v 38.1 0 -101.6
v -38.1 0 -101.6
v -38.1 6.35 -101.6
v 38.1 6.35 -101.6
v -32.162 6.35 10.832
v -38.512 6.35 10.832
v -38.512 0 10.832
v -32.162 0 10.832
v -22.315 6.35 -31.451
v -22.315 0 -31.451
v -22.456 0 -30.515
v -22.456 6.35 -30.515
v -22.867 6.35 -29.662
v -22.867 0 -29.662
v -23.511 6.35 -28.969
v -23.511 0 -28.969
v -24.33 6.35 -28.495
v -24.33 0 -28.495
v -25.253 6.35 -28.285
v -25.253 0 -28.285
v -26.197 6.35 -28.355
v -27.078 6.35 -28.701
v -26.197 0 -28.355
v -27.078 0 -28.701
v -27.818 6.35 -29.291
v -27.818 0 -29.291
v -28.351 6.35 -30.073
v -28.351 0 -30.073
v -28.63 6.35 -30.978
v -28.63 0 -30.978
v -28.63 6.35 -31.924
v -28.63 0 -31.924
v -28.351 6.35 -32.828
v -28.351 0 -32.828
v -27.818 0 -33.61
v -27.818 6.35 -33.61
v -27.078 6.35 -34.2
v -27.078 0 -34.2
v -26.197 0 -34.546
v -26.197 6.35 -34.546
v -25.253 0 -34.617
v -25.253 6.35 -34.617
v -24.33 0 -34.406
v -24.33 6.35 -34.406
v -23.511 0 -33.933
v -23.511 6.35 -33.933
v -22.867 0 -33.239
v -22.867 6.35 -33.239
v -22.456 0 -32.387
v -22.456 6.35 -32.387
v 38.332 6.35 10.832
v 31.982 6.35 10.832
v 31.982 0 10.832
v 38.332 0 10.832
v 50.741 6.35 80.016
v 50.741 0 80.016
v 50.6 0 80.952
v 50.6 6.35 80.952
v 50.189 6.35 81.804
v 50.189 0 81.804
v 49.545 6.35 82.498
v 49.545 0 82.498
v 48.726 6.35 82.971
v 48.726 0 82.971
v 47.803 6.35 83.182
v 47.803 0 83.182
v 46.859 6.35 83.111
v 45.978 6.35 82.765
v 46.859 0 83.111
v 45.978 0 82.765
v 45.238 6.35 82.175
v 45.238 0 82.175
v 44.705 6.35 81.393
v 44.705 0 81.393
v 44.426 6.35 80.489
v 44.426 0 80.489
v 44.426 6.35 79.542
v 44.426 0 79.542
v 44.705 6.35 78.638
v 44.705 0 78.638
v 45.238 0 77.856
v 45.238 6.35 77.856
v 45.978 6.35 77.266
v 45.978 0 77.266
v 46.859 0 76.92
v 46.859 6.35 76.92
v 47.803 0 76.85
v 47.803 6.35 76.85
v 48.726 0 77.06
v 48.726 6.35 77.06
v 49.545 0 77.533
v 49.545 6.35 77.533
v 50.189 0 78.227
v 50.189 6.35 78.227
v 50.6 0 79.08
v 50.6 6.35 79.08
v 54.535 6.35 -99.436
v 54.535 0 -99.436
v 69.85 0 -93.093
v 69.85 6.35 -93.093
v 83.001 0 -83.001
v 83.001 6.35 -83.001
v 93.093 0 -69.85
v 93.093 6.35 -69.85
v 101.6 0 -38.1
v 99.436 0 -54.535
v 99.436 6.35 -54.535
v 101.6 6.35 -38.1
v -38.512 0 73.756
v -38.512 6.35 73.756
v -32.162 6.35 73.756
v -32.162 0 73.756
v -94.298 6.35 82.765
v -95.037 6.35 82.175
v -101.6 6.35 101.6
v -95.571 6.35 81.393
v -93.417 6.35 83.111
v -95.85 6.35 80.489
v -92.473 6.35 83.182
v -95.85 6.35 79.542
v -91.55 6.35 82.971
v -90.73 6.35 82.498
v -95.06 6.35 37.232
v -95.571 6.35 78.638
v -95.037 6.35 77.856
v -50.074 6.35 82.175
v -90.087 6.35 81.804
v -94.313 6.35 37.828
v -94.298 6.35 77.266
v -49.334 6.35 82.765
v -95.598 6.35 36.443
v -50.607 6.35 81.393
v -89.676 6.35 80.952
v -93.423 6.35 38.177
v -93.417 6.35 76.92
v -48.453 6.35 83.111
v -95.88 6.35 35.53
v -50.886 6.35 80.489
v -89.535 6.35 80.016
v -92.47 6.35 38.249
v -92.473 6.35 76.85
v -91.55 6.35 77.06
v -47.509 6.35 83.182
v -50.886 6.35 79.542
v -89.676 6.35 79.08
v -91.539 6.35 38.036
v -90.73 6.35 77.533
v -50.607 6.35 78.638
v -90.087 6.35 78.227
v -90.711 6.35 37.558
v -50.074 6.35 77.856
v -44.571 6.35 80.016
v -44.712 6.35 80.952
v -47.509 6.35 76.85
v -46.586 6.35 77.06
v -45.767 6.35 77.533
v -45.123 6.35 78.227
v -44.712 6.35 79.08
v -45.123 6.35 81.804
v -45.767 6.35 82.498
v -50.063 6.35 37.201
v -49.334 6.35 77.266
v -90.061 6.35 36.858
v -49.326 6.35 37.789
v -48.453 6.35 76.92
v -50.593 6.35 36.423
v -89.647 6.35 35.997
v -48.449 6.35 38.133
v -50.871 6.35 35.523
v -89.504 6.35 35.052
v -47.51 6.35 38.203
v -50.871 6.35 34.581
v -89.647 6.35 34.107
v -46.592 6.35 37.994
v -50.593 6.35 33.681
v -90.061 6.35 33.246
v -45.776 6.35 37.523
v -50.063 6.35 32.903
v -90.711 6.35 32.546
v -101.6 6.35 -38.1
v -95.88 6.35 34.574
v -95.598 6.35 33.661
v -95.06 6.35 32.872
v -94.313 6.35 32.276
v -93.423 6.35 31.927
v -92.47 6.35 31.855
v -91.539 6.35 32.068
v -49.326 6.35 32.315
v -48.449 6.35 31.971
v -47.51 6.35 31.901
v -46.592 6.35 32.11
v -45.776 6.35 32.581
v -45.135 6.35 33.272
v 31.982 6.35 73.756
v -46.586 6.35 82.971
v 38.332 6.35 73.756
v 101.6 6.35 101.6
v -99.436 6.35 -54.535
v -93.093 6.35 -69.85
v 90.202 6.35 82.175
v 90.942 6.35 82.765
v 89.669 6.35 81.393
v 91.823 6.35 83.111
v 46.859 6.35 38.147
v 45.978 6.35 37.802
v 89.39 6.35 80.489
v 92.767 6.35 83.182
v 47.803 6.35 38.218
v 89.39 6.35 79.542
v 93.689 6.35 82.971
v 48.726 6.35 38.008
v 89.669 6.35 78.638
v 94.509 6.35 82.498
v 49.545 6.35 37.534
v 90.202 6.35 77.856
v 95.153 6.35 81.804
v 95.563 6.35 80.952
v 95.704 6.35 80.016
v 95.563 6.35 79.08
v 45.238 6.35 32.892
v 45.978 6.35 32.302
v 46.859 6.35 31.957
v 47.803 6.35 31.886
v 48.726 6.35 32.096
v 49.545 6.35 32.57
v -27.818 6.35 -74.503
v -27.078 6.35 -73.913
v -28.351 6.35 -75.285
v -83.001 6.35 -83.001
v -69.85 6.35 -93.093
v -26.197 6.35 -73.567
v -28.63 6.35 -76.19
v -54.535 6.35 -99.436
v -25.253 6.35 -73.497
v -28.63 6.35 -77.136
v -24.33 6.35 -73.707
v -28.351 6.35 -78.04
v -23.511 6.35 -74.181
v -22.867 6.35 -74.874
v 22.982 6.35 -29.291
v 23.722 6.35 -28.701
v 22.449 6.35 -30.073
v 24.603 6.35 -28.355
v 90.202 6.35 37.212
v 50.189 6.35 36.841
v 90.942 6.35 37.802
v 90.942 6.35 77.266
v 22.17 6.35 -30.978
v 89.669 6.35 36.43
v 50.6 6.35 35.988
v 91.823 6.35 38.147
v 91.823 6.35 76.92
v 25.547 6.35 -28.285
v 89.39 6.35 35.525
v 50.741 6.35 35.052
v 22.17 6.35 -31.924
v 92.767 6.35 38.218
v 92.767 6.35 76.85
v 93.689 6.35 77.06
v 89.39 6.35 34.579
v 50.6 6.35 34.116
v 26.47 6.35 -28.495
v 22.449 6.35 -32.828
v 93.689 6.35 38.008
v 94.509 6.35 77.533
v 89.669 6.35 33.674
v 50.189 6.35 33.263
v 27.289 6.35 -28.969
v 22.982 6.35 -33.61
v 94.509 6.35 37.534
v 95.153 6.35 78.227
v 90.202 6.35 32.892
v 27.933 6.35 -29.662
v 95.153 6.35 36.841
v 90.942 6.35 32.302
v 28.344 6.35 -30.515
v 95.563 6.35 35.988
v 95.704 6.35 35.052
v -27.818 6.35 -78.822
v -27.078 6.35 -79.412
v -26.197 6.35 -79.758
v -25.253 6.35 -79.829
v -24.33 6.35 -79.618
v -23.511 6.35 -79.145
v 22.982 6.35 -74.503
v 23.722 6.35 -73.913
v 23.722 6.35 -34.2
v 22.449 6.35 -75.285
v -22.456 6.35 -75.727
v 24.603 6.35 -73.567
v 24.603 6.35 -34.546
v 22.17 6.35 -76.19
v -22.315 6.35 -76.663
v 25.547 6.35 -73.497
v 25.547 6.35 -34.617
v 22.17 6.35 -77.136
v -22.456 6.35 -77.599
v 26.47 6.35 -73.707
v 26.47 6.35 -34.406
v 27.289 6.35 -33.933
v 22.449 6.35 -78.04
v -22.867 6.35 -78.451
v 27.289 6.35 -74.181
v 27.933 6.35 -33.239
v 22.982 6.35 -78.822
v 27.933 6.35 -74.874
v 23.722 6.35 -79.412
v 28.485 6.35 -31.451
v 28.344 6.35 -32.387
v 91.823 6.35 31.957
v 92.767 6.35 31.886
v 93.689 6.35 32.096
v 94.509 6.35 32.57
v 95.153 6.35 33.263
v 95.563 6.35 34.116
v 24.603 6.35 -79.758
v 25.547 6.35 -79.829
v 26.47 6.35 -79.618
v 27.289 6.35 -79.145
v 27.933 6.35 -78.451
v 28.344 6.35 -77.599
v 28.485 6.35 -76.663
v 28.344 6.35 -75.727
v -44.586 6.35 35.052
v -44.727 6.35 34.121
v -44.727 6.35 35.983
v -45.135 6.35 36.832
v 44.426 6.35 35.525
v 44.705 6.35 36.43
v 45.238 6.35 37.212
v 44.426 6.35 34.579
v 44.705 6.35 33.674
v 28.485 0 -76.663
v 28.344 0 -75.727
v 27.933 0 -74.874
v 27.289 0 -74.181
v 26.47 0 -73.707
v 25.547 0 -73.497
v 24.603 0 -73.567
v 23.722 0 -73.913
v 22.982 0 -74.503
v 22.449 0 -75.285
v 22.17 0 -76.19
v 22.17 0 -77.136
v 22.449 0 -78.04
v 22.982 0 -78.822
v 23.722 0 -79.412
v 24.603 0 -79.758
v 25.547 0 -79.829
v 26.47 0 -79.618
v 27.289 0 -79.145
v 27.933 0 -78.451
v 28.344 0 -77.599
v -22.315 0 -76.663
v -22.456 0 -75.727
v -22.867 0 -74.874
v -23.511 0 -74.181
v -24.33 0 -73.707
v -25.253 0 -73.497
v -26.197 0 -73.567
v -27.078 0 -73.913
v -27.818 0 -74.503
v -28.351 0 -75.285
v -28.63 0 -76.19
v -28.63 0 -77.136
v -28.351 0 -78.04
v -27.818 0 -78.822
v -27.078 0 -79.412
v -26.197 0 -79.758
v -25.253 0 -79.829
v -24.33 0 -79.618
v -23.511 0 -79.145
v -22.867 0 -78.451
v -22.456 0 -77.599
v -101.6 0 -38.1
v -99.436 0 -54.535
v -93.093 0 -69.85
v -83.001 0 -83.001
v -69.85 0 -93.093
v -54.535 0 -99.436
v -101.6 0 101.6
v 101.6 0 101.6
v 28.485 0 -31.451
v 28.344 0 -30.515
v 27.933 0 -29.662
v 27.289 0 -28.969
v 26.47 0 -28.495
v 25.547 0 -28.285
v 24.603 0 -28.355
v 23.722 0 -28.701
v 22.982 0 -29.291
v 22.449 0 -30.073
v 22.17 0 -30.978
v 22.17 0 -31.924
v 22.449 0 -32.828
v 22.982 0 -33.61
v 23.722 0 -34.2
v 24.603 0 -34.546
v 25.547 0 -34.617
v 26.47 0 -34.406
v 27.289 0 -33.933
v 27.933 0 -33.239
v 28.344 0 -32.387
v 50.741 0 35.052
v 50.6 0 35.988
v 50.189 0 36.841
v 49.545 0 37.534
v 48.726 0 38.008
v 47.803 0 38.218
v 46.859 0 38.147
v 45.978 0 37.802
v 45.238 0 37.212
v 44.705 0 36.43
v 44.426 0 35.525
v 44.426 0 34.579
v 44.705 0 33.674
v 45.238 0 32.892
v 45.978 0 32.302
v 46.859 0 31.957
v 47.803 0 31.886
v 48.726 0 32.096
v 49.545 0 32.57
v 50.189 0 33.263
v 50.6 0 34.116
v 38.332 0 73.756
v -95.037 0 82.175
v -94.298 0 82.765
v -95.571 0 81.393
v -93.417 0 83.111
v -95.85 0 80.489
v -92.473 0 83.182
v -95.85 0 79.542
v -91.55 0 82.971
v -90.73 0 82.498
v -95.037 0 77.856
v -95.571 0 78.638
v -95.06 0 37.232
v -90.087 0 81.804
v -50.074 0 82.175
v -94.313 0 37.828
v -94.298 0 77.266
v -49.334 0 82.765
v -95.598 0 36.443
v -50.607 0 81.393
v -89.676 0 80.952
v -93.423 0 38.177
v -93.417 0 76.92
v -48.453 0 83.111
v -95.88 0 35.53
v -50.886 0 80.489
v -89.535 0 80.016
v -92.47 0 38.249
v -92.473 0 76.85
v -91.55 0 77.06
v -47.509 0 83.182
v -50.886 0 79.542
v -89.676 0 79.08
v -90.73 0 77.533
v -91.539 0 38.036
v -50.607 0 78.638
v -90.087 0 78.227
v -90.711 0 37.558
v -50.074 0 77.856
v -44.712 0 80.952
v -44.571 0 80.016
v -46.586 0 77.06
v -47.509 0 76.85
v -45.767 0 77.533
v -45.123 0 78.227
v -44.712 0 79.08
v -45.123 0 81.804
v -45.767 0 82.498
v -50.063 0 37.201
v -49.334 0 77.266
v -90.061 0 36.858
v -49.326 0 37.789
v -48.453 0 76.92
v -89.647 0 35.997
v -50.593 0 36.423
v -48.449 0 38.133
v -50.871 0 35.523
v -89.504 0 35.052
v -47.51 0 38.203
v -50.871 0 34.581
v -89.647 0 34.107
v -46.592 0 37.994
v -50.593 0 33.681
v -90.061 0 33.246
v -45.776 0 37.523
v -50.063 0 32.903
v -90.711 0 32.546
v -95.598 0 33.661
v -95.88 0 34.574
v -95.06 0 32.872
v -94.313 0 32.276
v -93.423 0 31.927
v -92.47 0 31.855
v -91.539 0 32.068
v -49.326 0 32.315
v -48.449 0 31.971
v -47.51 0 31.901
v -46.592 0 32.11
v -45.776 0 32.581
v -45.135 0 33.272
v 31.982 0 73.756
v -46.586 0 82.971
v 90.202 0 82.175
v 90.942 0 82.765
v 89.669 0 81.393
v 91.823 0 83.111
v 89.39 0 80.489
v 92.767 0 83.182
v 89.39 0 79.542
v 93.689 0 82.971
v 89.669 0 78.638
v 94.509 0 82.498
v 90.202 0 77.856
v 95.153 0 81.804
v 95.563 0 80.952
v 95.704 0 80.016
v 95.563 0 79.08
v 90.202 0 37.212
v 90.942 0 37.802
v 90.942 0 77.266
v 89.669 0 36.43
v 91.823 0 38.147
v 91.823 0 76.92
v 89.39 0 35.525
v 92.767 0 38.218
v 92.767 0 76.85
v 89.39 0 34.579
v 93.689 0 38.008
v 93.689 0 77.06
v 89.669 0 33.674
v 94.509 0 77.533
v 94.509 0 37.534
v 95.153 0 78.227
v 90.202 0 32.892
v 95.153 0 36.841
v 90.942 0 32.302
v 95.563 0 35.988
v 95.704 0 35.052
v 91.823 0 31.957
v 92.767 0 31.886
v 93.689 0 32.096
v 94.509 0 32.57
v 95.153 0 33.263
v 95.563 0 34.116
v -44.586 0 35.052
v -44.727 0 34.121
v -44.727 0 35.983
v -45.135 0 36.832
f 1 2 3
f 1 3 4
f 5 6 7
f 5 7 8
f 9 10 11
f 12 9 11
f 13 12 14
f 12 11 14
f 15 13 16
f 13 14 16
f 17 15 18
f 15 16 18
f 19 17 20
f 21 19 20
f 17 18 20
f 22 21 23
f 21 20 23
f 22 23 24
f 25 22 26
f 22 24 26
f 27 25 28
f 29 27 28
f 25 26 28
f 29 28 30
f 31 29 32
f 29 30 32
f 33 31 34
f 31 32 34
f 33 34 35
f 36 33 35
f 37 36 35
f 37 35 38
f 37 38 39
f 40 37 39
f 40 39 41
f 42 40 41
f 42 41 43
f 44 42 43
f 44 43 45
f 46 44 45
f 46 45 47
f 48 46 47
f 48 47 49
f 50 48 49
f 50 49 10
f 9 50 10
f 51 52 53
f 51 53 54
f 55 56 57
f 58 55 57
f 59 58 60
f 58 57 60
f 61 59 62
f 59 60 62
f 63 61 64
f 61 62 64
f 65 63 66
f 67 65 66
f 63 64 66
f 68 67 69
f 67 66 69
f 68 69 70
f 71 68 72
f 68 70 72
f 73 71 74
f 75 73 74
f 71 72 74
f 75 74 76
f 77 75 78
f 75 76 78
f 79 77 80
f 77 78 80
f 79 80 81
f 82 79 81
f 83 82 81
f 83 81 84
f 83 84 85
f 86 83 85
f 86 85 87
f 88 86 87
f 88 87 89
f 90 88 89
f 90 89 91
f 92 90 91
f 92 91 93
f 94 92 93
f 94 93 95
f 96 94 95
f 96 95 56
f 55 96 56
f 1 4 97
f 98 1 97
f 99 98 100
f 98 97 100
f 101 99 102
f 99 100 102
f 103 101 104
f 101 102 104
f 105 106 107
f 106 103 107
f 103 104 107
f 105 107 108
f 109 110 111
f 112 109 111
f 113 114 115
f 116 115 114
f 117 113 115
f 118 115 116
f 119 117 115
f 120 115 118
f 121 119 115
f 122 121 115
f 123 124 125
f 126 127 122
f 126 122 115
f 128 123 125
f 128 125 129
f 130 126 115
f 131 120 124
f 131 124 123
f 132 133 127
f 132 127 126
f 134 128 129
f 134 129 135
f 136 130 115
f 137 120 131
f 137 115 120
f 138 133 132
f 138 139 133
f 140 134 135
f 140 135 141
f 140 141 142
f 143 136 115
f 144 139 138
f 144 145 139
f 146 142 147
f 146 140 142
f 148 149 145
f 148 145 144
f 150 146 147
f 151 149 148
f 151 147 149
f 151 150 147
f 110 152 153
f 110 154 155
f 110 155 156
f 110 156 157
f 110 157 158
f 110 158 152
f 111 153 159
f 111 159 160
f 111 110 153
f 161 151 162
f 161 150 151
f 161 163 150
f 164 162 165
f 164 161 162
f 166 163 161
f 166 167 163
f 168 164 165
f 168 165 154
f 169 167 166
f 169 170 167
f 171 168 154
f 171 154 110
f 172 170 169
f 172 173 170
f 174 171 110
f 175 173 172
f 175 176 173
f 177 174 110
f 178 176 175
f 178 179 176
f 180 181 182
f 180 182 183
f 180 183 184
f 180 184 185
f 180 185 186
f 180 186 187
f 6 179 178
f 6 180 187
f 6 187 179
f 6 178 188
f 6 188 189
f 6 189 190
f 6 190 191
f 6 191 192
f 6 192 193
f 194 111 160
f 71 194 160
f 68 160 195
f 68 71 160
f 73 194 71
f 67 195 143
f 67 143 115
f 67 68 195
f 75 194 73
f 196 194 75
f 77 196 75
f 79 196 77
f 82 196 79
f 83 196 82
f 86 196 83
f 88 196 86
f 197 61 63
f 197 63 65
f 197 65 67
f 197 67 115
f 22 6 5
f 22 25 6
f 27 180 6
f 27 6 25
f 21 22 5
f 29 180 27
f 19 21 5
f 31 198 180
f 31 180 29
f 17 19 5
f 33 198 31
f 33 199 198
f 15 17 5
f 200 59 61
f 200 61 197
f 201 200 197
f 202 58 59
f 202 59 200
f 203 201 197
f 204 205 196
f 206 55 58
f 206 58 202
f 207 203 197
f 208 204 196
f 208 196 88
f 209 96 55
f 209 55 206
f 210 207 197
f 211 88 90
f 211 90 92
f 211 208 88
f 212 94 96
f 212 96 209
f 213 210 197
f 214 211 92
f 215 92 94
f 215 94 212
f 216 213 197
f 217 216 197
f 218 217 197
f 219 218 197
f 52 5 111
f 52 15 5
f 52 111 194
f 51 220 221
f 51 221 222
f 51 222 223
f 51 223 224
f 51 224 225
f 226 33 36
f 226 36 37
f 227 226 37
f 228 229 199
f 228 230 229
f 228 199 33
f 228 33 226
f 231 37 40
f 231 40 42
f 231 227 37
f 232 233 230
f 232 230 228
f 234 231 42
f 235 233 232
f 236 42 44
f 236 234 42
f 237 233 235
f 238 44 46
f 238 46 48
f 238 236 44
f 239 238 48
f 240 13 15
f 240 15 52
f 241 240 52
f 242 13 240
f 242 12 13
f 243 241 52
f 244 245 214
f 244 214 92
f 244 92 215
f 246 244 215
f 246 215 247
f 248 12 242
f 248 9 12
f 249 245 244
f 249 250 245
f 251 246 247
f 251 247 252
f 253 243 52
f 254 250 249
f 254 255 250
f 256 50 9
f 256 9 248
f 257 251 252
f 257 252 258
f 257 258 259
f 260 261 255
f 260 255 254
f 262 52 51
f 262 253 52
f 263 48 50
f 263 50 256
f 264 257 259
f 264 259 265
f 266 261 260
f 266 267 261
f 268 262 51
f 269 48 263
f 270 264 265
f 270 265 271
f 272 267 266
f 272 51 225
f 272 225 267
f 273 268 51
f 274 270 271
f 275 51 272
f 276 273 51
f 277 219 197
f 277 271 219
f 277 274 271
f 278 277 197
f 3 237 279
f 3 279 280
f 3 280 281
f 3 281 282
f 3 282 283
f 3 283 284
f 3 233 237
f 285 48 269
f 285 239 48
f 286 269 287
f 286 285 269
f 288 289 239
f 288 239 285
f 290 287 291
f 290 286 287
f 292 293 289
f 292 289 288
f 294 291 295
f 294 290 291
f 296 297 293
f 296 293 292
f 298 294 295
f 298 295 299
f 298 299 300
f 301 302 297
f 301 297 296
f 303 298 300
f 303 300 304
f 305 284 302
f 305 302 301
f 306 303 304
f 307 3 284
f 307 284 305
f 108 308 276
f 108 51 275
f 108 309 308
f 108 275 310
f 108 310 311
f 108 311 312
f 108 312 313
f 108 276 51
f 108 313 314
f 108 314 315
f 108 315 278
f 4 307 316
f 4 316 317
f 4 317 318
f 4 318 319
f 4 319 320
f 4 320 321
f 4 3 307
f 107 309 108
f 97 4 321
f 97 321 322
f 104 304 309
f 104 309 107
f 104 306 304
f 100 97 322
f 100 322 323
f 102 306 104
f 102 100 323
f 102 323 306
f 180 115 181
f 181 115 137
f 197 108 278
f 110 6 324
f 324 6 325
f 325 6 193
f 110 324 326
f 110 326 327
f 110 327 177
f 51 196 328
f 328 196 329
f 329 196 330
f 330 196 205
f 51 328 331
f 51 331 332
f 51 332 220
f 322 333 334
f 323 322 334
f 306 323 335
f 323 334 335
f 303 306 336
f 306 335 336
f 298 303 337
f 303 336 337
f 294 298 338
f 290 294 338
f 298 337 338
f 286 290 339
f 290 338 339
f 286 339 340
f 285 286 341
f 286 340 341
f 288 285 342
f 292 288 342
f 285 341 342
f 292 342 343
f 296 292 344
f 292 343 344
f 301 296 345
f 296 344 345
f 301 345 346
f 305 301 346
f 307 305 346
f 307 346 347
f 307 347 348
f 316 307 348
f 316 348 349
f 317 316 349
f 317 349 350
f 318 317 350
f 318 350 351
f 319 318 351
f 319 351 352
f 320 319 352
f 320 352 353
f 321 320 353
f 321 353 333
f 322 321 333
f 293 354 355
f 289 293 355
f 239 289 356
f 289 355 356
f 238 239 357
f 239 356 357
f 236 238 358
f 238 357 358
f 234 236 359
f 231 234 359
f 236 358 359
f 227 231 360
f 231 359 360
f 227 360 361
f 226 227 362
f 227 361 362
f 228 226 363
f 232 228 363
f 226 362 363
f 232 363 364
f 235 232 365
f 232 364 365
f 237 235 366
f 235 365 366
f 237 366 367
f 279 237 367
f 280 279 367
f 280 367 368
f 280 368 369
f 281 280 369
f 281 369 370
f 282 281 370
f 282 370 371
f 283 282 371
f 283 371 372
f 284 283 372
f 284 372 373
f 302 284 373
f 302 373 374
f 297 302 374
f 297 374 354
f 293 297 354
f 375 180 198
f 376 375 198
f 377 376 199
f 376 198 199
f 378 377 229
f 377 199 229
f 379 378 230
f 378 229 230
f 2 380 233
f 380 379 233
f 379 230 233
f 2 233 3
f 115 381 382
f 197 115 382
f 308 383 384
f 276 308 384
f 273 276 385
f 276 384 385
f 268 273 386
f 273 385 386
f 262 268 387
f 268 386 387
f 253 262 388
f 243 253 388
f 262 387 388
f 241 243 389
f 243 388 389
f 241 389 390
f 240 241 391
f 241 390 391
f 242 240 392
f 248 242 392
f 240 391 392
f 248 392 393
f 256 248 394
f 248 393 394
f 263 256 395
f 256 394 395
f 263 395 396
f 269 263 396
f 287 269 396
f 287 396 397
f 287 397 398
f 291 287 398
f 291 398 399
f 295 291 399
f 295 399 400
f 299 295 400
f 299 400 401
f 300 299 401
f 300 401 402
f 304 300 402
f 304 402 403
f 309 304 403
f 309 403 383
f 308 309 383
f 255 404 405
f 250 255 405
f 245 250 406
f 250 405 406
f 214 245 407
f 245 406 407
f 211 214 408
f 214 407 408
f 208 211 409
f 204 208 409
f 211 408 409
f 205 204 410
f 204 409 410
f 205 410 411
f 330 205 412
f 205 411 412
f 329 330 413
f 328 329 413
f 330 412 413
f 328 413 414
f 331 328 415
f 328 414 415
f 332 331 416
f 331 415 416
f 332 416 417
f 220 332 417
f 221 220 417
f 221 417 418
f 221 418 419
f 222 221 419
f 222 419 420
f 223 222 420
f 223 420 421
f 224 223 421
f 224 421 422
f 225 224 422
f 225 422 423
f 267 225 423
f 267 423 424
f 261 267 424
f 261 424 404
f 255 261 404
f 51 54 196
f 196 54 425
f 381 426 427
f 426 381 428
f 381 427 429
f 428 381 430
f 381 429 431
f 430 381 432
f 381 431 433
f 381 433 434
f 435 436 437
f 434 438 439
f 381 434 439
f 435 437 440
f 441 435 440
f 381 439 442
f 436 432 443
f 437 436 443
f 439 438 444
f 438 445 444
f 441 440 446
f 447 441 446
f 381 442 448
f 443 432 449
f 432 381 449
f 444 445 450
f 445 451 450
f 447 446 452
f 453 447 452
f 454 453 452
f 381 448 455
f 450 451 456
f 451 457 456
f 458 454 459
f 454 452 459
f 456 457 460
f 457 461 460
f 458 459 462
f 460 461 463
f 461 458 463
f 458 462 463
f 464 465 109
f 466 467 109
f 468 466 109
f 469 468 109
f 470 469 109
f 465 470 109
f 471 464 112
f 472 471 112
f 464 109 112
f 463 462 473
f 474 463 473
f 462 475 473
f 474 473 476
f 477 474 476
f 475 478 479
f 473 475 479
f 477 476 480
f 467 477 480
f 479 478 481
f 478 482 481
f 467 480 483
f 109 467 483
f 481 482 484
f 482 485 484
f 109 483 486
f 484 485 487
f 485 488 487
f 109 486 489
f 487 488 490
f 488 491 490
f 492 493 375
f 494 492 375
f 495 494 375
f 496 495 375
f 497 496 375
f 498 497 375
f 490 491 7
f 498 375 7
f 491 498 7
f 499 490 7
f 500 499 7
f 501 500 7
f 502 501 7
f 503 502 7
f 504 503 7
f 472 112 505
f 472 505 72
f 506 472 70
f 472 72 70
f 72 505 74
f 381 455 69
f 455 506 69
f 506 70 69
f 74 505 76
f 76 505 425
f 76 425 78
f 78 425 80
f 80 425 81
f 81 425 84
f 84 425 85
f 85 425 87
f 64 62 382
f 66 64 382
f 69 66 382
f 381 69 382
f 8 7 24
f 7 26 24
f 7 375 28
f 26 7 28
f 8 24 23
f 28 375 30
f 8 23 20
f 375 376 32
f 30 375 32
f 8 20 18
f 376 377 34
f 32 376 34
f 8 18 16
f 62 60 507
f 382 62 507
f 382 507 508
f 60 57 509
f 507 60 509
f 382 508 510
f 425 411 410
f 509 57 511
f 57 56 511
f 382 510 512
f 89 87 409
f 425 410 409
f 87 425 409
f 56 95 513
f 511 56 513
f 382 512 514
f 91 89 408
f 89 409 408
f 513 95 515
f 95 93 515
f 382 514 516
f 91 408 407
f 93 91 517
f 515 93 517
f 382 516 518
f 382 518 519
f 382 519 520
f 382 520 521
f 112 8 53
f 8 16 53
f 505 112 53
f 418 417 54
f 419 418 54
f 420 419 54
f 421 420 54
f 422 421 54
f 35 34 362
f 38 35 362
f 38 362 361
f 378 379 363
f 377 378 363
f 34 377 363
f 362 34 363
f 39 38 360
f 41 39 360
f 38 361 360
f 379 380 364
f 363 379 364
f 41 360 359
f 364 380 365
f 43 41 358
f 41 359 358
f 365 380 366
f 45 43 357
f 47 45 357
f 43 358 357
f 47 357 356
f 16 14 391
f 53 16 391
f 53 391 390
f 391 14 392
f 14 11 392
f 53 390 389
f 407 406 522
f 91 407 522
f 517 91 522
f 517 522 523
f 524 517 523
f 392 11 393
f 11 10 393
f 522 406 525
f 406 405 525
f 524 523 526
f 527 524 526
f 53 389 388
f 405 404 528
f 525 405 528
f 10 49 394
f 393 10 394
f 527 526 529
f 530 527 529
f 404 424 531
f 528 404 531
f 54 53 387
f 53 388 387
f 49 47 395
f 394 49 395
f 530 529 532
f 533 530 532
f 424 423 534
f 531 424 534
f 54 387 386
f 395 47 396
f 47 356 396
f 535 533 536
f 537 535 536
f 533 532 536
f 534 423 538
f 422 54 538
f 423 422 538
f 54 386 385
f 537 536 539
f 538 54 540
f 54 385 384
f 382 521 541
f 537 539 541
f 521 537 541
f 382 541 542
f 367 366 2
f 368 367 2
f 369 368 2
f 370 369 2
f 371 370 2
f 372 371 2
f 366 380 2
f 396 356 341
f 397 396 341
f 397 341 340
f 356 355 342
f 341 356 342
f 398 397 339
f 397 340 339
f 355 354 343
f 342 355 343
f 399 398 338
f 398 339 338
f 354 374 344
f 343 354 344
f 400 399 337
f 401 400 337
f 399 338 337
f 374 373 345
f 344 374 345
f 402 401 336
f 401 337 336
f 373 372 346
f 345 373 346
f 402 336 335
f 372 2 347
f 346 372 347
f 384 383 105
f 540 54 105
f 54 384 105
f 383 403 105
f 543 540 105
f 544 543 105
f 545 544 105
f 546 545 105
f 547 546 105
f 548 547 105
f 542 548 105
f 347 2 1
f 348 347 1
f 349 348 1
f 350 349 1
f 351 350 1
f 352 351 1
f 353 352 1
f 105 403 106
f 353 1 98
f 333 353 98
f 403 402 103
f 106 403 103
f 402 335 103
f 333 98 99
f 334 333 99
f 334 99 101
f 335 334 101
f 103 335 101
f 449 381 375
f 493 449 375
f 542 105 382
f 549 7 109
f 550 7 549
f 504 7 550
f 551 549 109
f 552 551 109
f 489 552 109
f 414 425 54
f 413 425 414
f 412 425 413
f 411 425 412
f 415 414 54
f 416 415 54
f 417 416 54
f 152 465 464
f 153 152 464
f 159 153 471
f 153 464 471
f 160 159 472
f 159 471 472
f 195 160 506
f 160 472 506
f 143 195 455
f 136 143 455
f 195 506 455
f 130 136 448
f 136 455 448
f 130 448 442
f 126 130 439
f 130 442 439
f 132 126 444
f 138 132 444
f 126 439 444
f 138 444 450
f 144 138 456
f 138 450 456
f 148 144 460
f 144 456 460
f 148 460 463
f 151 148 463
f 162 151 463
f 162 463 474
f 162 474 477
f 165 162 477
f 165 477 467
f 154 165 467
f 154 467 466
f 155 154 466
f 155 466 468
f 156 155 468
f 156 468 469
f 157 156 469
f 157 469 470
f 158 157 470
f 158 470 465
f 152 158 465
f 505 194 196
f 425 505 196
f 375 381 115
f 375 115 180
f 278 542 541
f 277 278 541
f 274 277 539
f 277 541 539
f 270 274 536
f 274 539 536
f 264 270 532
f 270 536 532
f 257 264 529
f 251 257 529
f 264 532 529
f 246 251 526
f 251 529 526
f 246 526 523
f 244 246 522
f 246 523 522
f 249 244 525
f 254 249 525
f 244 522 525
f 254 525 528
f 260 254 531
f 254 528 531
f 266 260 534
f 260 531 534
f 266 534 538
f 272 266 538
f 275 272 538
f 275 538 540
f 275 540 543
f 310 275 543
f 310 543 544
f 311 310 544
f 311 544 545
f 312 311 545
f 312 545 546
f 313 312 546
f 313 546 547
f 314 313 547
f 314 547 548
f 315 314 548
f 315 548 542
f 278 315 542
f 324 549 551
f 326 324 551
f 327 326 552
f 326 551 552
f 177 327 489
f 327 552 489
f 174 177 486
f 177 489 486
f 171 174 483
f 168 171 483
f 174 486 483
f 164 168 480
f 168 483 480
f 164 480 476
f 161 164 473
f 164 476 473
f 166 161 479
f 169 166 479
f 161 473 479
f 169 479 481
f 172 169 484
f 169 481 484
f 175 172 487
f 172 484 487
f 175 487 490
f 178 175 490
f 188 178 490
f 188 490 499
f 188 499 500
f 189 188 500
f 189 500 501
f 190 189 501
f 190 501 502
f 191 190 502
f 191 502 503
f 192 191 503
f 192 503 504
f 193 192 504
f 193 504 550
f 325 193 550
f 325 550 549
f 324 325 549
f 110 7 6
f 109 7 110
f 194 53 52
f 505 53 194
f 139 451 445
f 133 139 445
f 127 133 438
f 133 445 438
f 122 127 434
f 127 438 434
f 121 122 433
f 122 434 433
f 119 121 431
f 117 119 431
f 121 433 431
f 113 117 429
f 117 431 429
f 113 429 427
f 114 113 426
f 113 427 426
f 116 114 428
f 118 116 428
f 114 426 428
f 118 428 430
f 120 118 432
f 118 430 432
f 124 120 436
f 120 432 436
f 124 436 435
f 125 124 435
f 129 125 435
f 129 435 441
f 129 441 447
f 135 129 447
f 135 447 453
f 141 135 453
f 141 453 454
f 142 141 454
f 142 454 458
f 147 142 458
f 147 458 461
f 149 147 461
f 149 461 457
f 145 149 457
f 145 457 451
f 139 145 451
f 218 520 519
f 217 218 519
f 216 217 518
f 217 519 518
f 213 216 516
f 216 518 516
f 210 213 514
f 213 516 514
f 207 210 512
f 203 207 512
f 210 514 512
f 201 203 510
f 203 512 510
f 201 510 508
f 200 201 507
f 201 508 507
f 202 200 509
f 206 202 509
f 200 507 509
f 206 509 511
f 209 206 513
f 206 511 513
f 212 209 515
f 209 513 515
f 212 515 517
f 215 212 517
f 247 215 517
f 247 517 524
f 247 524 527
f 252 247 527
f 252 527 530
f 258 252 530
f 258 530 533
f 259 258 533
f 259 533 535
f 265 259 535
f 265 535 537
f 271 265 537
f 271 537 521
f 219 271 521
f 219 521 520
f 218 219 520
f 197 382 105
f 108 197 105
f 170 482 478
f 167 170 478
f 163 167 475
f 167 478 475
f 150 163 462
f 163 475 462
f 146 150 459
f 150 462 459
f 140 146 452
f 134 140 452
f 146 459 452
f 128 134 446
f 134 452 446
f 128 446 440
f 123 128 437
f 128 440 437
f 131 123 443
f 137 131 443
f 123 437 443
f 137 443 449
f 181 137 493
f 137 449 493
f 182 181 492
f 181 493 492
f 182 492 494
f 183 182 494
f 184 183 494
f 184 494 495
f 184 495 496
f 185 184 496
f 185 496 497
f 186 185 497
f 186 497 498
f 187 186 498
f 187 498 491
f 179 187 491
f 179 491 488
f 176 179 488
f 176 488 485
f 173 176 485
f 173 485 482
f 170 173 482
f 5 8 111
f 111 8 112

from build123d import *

# Parameters (mm, degrees)
SKETCH1_W           = 203.2
SKETCH1_H           = 203.2
BOSS_EXTRUDE1_DEPTH = 6.35
CUT_EXTRUDE1_DEPTH  = 7.35
SKETCH9_R           = 3.175
SKETCH9_R_2         = 3.160008279
SKETCH9_R_3         = 3.205750029
SKETCH9_W           = 6.35
SKETCH9_H           = 62.924217451
CUT_EXTRUDE2_DEPTH  = 7.35


with BuildPart() as part:
    # Sketch1 → Boss-Extrude1 (new body)
    with BuildSketch(Plane(origin=(0, 0, 0), x_dir=(1, 0, 0), z_dir=(0, 1, 0))):
        Rectangle(SKETCH1_W, SKETCH1_H)
    extrude(amount=BOSS_EXTRUDE1_DEPTH)

    # Sketch2 → Cut-Extrude1 (cut, through all)
    with BuildSketch(Plane(origin=(0, 6.35, 0), x_dir=(1, 0, 0), z_dir=(0, 1, 0))):
        with BuildLine():
            Line((101.6, 38.1), (101.6, 101.6))
            Line((101.6, 101.6), (38.1, 101.6))
            ThreePointArc((38.1, 101.6), (83.001280605, 83.001280605), (101.6, 38.1))
        make_face()
        with BuildLine():
            Line((-38.1, 101.6), (-101.6, 101.6))
            Line((-101.6, 101.6), (-101.6, 38.1))
            ThreePointArc((-101.6, 38.1), (-83.001280605, 83.001280605), (-38.1, 101.6))
        make_face()
    extrude(amount=-CUT_EXTRUDE1_DEPTH, mode=Mode.SUBTRACT)

    # Sketch9 → Cut-Extrude2 (cut, through all)
    with BuildSketch(Plane.XZ):
        with Locations((-25.490256121, -31.45083867)):
            Circle(SKETCH9_R)
        with Locations((25.309743879, -31.45083867)):
            Circle(SKETCH9_R)
        with Locations((-25.490256121, -76.66283867)):
            Circle(SKETCH9_R)
        with Locations((25.309743879, -76.66283867)):
            Circle(SKETCH9_R)
        with Locations((-47.746294791, 80.015705209)):
            Circle(SKETCH9_R)
        with Locations((-92.71, 80.015705209)):
            Circle(SKETCH9_R)
        with Locations((-47.746294791, 35.052)):
            Circle(SKETCH9_R_2)
        with Locations((-92.71, 35.052)):
            Circle(SKETCH9_R_3)
        with Locations((47.565782549, 80.015705209)):
            Circle(SKETCH9_R)
        with Locations((92.529487758, 80.015705209)):
            Circle(SKETCH9_R)
        with Locations((47.565782549, 35.052)):
            Circle(SKETCH9_R)
        with Locations((92.529487758, 35.052)):
            Circle(SKETCH9_R)
        with Locations((-35.33703867, 42.293852605)):
            Rectangle(SKETCH9_W, SKETCH9_H)
        with Locations((35.156526428, 42.293852605)):
            Rectangle(SKETCH9_W, SKETCH9_H)
    extrude(amount=-CUT_EXTRUDE2_DEPTH, mode=Mode.SUBTRACT)


solid = part.part
